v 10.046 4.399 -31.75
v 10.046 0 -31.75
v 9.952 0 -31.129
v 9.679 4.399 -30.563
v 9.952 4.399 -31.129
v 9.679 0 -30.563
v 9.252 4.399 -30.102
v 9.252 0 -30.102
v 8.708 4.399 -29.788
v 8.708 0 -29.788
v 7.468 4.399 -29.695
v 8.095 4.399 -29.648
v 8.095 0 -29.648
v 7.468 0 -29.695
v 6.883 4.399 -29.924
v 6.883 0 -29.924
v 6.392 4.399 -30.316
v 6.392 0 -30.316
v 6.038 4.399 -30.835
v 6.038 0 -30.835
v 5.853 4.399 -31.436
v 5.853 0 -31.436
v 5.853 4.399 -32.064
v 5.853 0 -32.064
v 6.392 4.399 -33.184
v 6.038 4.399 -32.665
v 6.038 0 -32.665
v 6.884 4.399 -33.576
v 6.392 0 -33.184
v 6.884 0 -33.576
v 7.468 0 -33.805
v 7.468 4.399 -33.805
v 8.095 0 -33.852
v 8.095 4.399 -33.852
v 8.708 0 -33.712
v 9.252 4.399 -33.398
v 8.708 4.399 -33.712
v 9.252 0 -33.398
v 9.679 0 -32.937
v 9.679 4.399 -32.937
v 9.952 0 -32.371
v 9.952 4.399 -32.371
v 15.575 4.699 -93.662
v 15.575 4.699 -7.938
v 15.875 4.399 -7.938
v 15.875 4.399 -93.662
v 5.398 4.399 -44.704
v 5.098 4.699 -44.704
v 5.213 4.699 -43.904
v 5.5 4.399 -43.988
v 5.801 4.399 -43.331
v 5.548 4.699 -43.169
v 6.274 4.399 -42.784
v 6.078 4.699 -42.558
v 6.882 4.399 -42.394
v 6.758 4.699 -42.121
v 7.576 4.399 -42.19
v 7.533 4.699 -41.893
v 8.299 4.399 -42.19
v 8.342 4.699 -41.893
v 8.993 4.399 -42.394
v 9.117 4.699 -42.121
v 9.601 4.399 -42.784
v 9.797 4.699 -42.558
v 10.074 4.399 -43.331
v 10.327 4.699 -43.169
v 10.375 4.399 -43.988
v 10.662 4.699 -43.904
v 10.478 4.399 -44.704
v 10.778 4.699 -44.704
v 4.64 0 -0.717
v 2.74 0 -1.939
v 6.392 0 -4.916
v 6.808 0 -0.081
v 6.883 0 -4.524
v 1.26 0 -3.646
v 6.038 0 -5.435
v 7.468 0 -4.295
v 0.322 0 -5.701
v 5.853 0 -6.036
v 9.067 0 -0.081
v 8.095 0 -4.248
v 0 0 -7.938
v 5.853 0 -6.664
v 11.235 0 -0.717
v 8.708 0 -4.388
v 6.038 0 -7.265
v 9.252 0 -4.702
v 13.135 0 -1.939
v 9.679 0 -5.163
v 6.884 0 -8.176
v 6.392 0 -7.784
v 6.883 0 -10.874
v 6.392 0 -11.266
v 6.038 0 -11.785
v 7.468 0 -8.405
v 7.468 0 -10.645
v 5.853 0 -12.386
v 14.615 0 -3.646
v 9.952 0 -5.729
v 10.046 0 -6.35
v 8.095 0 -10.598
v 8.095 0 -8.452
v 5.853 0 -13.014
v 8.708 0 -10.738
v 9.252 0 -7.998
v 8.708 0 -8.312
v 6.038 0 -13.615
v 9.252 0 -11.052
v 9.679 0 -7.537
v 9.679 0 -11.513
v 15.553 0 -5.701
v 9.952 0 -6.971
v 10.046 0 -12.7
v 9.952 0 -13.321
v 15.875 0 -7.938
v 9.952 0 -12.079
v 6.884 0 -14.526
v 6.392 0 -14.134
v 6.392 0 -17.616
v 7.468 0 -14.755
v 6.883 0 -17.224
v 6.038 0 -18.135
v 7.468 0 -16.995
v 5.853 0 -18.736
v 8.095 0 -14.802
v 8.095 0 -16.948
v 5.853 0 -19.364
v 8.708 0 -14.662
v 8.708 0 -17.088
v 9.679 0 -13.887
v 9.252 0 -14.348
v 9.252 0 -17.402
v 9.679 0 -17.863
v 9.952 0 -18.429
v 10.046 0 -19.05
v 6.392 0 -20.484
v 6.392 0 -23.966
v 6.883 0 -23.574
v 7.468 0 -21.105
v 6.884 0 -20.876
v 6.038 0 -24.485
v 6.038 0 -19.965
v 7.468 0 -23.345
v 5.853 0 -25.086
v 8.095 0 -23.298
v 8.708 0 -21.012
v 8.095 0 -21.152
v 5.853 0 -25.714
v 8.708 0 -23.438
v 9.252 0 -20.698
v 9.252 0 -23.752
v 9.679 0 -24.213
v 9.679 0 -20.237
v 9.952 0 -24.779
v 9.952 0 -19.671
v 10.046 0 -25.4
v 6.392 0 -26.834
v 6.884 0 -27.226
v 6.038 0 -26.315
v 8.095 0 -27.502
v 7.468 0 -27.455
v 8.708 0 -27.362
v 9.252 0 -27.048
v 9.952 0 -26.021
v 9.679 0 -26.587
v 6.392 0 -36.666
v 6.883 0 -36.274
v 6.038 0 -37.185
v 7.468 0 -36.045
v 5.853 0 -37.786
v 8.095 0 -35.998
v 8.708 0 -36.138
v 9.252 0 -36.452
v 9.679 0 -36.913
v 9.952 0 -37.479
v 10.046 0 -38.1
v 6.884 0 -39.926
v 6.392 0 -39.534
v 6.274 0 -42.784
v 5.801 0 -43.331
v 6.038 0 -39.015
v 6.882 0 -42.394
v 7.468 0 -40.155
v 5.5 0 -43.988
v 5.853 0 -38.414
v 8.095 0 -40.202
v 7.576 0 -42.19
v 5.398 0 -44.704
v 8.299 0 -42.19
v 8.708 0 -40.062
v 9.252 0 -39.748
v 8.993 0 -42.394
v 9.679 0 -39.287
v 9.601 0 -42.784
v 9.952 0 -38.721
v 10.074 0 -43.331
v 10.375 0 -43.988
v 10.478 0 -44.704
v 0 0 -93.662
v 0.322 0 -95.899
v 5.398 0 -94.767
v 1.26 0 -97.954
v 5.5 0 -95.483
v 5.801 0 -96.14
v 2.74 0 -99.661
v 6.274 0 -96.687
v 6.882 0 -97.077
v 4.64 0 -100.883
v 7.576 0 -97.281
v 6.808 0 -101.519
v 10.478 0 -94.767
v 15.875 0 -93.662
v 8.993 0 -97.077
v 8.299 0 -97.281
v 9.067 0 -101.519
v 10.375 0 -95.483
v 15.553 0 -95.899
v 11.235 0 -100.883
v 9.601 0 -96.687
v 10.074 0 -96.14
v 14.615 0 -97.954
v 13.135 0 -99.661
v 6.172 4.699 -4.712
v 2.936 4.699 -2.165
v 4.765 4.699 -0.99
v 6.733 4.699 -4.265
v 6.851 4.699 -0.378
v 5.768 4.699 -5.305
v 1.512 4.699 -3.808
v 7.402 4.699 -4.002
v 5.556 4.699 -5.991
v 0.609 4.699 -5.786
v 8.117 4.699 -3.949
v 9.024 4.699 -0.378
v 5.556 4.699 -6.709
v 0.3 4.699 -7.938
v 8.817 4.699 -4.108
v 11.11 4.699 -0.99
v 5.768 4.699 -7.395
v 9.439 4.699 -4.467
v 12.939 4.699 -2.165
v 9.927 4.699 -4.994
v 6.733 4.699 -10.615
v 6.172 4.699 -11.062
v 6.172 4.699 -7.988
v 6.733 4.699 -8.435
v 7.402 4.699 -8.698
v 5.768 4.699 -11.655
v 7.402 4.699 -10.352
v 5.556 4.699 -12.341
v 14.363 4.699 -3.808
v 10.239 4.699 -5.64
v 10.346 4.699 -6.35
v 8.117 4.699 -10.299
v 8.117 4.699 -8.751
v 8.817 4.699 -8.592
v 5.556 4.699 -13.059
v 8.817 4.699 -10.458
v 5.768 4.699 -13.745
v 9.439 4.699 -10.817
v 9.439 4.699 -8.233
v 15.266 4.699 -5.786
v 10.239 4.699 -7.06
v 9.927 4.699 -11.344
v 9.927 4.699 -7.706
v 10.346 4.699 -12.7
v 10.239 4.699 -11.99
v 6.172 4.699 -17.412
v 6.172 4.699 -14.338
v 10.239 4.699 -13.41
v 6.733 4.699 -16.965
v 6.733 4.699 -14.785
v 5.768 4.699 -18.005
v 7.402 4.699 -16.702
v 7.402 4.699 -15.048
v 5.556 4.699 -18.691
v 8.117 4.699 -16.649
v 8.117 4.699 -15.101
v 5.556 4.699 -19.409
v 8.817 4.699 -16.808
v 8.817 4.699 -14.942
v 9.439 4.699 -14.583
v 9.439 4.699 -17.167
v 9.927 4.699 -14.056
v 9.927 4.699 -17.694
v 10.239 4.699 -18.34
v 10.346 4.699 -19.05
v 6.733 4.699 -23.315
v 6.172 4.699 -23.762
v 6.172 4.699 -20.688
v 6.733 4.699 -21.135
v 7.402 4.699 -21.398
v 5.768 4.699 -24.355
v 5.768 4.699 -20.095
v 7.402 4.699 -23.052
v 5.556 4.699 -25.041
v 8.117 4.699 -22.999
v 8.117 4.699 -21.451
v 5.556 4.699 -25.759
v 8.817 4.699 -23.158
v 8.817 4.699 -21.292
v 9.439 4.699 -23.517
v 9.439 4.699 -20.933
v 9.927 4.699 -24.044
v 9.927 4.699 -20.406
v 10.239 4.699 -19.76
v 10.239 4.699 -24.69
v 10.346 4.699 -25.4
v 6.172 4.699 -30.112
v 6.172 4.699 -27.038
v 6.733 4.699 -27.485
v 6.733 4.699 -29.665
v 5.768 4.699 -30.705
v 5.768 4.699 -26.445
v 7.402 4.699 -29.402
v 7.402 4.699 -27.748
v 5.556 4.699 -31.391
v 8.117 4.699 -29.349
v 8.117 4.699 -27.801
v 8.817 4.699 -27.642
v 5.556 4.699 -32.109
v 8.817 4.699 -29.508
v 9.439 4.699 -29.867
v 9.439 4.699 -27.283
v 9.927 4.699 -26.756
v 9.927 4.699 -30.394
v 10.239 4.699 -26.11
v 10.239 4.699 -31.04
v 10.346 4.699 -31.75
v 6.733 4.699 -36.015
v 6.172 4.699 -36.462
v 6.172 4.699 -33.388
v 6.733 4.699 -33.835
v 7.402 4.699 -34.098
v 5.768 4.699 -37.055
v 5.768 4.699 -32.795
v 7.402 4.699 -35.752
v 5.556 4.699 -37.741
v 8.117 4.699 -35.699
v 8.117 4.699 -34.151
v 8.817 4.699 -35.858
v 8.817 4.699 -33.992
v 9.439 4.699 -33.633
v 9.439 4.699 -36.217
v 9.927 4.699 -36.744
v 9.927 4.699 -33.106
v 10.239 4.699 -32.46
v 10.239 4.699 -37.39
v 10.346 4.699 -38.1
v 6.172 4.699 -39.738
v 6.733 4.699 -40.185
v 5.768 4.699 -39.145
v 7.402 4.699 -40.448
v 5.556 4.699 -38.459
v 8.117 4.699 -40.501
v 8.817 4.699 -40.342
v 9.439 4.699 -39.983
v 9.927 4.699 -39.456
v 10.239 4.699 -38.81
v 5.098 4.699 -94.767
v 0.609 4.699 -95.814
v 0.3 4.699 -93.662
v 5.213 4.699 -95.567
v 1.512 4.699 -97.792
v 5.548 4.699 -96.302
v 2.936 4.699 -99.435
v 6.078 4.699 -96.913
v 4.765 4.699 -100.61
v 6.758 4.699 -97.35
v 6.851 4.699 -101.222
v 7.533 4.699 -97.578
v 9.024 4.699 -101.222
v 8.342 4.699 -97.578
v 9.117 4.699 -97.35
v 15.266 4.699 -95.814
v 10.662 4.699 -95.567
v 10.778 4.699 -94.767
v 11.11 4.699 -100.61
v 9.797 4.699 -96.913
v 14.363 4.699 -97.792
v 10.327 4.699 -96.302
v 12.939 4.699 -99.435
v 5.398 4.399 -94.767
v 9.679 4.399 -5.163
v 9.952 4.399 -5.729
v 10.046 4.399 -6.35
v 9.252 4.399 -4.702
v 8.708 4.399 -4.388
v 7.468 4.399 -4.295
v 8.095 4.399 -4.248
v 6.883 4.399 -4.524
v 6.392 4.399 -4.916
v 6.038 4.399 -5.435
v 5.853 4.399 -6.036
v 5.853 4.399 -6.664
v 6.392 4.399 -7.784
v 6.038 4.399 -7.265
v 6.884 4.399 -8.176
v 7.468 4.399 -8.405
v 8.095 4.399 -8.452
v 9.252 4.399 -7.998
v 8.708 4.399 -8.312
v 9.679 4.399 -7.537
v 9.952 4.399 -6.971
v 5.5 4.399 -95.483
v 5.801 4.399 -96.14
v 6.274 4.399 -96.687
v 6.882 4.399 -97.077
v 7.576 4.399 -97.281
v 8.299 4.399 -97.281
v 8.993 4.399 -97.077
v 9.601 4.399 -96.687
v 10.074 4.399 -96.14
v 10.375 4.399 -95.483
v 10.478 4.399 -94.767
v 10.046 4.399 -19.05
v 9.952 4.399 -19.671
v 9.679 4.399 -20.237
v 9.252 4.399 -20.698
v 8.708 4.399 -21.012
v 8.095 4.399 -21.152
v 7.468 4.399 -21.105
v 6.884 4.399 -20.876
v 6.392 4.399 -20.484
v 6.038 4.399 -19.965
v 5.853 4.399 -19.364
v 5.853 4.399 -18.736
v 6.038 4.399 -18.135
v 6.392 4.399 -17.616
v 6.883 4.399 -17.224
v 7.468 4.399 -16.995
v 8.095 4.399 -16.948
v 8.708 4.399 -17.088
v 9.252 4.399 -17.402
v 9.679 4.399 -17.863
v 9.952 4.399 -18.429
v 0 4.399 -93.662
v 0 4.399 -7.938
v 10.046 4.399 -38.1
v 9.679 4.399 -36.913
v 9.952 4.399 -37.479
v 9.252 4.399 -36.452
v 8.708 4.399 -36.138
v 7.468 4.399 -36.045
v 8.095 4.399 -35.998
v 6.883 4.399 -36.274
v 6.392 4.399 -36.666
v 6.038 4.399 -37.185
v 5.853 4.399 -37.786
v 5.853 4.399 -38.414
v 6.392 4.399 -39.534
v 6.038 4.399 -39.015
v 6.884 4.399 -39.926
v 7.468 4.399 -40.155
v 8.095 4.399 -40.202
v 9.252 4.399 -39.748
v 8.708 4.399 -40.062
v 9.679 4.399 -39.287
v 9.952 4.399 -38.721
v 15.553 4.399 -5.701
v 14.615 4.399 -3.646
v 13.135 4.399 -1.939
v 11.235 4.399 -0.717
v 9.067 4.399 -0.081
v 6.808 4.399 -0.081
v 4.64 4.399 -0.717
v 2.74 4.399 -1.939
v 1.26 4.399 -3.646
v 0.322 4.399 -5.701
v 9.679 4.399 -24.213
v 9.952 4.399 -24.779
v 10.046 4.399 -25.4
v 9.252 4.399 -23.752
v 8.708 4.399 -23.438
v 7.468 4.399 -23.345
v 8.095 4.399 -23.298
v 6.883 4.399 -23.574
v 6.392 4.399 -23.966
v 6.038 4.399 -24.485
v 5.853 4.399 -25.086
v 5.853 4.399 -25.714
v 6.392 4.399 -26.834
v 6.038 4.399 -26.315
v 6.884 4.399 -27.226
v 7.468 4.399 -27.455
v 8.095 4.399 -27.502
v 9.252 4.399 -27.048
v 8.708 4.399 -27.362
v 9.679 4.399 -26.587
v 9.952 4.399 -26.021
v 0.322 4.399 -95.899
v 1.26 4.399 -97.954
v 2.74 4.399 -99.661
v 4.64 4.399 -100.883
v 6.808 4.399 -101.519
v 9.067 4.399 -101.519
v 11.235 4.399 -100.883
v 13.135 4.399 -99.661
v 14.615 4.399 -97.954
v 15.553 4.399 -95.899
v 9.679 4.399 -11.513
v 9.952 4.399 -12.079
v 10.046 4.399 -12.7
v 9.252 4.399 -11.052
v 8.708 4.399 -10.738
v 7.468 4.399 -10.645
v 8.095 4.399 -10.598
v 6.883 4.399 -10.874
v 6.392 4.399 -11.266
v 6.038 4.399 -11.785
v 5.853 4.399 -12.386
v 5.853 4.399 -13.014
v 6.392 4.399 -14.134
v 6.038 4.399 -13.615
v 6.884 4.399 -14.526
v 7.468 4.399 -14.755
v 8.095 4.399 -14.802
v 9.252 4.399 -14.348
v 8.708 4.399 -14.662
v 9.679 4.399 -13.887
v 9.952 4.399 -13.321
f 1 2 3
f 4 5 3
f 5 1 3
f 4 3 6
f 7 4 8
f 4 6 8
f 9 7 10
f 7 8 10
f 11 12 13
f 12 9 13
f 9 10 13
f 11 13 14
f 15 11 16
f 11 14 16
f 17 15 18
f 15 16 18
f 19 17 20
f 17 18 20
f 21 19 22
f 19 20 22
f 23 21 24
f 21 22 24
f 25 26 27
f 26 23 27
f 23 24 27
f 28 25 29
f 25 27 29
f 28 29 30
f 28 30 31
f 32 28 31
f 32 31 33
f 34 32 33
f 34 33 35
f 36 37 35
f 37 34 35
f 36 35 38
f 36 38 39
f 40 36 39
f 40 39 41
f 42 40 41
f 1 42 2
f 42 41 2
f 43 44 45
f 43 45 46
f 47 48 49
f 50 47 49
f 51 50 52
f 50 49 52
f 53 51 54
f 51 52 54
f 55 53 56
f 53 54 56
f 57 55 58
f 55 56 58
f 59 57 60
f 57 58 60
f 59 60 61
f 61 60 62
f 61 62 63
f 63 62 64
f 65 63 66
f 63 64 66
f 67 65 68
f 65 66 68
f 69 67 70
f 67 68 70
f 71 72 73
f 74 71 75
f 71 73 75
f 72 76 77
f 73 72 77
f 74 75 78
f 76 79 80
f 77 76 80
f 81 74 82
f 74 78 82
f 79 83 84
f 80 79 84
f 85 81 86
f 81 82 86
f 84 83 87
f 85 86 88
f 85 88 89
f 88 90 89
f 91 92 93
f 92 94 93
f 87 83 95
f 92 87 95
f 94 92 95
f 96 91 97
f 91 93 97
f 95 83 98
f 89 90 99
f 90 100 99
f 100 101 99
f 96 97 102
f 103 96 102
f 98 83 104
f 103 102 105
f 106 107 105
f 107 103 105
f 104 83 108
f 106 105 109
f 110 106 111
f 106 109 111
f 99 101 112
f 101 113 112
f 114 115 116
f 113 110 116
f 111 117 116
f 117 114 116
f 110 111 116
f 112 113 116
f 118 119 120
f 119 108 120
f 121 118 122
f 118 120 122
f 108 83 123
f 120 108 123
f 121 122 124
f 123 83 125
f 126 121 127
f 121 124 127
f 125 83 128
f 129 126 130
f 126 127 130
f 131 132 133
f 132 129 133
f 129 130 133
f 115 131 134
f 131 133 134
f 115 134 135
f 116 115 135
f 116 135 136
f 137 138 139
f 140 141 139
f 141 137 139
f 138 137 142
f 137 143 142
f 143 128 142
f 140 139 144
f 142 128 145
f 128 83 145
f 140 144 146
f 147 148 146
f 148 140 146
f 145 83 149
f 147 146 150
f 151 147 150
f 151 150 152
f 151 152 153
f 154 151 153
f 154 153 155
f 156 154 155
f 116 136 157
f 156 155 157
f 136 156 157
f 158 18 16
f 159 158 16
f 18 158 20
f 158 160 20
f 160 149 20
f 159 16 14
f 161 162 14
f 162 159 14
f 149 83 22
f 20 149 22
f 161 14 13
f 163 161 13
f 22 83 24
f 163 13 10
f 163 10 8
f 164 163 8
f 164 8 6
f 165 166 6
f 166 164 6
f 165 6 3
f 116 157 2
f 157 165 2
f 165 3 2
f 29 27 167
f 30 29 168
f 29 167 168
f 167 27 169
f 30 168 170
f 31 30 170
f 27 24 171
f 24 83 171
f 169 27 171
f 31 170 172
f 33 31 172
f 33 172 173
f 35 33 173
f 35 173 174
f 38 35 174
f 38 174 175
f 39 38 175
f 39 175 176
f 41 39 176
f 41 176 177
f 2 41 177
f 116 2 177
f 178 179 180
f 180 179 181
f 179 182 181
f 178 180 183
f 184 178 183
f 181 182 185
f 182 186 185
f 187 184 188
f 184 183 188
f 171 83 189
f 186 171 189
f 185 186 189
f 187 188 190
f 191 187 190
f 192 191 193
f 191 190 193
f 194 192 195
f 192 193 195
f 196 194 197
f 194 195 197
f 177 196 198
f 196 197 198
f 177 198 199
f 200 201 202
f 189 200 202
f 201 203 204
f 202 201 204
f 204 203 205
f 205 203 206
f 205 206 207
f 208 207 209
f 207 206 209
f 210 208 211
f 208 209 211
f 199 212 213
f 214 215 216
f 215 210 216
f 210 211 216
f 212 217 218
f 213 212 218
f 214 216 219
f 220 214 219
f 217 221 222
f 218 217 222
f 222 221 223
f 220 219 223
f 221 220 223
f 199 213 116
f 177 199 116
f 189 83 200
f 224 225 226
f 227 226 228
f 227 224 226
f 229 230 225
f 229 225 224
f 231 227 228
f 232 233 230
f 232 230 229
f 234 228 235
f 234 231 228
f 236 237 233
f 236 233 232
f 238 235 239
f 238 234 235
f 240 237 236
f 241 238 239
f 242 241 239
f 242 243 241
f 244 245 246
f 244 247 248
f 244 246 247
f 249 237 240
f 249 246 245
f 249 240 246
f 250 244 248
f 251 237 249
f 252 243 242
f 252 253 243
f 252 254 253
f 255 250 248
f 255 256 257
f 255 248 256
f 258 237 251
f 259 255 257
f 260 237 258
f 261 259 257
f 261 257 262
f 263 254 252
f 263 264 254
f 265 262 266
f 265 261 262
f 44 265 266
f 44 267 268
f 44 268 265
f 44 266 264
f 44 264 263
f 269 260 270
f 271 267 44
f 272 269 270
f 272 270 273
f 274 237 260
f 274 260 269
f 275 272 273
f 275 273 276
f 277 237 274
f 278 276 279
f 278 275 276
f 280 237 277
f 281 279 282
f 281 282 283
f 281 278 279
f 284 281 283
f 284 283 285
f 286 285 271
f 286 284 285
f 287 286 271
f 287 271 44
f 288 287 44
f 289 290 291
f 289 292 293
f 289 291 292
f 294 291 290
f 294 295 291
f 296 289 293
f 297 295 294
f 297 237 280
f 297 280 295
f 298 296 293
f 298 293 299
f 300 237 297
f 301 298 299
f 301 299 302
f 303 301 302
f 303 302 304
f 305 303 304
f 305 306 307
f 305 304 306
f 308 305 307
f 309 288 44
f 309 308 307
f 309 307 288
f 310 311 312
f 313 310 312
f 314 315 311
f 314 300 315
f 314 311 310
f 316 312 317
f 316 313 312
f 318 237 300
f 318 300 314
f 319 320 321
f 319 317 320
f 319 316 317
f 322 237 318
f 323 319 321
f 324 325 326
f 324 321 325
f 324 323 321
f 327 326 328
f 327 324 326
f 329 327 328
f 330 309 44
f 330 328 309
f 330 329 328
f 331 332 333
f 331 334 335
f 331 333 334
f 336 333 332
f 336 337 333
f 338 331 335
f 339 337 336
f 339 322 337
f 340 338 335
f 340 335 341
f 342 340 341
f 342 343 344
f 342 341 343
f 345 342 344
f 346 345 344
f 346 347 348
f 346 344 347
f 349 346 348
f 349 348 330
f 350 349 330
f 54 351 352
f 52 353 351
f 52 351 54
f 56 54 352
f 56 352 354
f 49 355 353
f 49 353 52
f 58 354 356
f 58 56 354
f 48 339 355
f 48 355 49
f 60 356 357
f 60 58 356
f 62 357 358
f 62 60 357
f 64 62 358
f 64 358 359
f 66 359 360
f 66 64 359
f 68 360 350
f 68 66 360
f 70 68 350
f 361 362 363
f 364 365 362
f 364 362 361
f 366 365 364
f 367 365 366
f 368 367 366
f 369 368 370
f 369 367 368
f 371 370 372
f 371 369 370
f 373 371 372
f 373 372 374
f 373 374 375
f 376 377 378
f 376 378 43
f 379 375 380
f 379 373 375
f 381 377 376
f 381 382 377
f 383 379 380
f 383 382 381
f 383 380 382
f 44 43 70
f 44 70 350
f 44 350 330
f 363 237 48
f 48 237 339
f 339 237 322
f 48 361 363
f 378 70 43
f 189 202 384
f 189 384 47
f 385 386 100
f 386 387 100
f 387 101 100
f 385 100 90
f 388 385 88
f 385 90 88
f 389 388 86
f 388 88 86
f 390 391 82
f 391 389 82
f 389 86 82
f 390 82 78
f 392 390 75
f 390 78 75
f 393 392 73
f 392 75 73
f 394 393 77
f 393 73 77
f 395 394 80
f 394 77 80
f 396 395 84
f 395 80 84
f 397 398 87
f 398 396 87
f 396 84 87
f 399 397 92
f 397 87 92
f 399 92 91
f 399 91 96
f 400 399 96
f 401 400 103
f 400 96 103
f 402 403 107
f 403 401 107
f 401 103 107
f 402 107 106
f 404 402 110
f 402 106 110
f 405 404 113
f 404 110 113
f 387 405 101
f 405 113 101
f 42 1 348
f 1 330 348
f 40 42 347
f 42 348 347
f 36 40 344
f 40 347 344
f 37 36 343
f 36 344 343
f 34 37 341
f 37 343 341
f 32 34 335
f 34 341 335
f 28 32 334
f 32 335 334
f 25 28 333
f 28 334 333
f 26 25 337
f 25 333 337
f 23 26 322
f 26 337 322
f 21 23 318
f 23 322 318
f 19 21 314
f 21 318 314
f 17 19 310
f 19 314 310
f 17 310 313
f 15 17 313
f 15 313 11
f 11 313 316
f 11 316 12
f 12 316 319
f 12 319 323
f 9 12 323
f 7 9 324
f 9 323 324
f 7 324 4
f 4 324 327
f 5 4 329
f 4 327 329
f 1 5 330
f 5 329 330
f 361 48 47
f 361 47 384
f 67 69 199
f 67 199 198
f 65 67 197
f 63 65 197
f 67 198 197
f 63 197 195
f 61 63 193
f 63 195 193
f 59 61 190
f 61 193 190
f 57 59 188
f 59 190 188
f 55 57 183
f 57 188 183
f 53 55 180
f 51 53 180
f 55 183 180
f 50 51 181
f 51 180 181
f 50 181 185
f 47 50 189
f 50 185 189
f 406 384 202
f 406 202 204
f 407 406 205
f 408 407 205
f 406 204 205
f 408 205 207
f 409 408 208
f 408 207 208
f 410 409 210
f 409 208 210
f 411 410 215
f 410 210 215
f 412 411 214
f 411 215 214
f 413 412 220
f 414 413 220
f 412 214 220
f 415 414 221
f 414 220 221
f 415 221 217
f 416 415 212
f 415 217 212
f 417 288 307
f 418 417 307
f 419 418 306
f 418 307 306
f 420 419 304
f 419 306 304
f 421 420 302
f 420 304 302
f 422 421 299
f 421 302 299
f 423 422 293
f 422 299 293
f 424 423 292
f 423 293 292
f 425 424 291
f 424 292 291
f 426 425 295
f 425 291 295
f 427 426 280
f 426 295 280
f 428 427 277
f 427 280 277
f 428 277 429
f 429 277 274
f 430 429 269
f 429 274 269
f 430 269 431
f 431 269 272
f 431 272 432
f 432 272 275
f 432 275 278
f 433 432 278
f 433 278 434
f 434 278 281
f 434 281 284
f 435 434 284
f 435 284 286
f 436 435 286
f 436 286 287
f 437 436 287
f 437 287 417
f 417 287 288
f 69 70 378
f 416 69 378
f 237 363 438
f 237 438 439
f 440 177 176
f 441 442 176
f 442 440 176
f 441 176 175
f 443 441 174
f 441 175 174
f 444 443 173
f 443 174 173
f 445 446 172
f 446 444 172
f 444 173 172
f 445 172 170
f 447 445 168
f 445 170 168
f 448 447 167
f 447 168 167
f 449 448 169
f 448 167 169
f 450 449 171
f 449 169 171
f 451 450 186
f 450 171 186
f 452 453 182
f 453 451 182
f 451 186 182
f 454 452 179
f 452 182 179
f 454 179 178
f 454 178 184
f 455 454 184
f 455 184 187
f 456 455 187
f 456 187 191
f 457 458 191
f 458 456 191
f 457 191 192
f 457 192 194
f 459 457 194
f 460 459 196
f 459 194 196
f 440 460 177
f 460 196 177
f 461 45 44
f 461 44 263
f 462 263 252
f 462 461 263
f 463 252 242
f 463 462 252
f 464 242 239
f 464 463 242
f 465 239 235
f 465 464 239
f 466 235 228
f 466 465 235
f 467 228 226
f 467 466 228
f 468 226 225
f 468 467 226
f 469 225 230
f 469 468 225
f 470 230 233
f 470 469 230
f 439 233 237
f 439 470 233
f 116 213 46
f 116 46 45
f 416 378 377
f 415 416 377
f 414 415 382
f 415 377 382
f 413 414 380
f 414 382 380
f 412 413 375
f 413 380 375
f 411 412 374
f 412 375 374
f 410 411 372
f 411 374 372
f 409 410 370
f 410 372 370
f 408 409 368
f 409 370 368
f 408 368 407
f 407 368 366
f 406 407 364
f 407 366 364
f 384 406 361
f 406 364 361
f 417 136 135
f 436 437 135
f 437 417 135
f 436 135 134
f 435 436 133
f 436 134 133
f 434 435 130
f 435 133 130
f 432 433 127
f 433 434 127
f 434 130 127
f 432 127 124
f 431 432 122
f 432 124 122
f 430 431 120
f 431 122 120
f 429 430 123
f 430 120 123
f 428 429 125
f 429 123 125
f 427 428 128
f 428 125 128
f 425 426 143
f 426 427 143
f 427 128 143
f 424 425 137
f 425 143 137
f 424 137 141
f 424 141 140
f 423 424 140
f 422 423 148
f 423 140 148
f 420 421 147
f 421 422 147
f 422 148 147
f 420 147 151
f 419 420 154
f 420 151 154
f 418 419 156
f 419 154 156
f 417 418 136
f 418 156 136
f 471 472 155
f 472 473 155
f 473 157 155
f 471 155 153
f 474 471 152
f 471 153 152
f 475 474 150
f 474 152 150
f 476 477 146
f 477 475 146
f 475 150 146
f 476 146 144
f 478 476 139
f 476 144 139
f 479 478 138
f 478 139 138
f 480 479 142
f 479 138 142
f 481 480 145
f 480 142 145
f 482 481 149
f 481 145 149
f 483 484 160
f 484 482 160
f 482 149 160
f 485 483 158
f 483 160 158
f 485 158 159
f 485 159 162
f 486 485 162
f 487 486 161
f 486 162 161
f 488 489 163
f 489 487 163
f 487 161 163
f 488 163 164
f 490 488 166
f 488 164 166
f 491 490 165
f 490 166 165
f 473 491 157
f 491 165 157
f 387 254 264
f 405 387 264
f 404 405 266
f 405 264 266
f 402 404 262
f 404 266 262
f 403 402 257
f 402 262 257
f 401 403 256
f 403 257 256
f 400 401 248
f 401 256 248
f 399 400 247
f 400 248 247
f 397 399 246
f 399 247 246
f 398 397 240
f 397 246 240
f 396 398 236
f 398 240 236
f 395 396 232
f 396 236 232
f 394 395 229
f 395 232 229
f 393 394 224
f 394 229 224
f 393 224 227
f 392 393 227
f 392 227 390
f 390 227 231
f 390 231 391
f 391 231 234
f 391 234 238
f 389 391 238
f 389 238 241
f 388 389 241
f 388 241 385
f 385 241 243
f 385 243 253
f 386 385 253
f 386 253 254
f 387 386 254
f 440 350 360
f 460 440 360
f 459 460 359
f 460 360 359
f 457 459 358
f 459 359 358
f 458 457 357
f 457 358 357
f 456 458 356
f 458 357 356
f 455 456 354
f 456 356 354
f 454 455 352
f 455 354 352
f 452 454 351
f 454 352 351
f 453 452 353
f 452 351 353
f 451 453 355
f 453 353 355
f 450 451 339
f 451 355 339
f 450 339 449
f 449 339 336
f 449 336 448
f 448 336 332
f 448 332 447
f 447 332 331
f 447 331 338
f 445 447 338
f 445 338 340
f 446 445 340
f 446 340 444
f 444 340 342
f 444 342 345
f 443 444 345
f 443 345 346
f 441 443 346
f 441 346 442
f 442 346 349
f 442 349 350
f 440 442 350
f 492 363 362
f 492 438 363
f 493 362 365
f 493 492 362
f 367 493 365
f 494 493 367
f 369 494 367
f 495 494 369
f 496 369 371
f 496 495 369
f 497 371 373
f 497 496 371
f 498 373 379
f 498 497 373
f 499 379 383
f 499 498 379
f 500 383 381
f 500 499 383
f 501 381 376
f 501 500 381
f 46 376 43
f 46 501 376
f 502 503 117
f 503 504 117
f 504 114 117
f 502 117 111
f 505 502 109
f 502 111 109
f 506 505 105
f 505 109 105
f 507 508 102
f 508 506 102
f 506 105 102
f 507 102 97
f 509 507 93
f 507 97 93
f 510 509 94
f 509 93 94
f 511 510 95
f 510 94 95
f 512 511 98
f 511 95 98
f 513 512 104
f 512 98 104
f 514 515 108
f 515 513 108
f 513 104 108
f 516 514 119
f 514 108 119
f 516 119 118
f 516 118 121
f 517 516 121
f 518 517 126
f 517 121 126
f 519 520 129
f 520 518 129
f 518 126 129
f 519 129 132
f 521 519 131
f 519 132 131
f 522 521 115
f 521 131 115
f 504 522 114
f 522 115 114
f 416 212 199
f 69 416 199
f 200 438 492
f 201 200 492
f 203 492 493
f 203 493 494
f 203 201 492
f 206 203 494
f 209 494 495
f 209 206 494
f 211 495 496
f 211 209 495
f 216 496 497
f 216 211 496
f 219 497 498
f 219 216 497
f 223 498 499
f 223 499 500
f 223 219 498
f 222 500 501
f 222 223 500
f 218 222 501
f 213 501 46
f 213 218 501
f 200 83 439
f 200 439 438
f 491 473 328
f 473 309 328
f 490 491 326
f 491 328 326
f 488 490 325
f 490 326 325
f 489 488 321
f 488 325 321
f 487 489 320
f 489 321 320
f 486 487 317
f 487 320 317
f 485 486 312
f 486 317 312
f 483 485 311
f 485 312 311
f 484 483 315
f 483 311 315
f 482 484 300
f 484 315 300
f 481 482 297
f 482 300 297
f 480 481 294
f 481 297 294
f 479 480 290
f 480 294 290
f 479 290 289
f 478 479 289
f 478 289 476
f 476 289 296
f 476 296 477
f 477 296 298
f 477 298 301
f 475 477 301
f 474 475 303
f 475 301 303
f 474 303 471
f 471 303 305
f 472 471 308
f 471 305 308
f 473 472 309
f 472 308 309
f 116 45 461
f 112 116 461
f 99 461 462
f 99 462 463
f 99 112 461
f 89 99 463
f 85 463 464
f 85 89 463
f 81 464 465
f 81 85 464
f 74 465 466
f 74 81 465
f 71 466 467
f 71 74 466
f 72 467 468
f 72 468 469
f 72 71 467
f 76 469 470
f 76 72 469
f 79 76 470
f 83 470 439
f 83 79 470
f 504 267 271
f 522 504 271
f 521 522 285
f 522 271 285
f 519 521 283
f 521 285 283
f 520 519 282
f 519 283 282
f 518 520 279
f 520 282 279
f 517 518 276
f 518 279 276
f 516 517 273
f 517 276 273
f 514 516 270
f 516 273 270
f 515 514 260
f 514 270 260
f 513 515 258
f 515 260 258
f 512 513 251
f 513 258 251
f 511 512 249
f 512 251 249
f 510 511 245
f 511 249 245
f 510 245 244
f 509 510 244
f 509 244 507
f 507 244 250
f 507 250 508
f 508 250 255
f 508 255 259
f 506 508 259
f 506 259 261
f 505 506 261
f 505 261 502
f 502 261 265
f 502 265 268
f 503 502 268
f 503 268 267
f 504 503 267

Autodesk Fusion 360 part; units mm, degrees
sketch "Esboço1" plane through (0, 0, 0) normal (0, 1, 0) x (1, 0, 0)
  line L0 (0, 7.9375) -> (0, 93.6625)
  line L1 (15.875, 93.6625) -> (15.875, 7.9375)
  arc A0 (0, 7.9375) -> (15.875, 7.9375) centre (7.9375, 7.9375) ccw
  arc A1 (15.875, 93.6625) -> (0, 93.6625) centre (7.9375, 93.6625) ccw
  line L2 (7.9375, 38.1) -> (7.9375, 38)
  line L3 (7.9375, 6.35) -> (7.9375, 7.9375)
  circle A2 centre (7.9375, 6.35) radius 2.108
  circle A3 centre (7.9375, 12.7) radius 2.108
  circle A4 centre (7.9375, 19.05) radius 2.108
  circle A5 centre (7.9375, 25.4) radius 2.108
  circle A6 centre (7.9375, 31.75) radius 2.108
  circle A7 centre (7.9375, 38.1) radius 2.108
  line L4 (7.9375, 12.7) -> (7.9375, 14.808)
  arc A8 (10.4775, 94.767) -> (5.3975, 94.767) centre (7.9375, 94.767) ccw
  arc A9 (5.3975, 44.704) -> (10.4775, 44.704) centre (7.9375, 44.704) ccw
  line L5 (5.3975, 94.767) -> (5.3975, 44.704)
  line L6 (10.4775, 94.767) -> (10.4775, 44.704)
  dimension "d7" = 6.35
  dimension "d8" = 6.35
  dimension "d9" = 6.35
  dimension "d10" = 6.35
  dimension "d11" = 6.35
  dimension "d12" = 4.216
  dimension "d13" = 4.216
  dimension "d14" = 4.216
  dimension "d15" = 4.216
  dimension "d16" = 4.216
  dimension "d17" = 4.216
  dimension "d19" = 5.08
  dimension "d20" = 50.063
  dimension "d21" = 5.08
extrude "Extrusão1" add sketch "Esboço1" along normal blind 4.699
chamfer "Chanfro1" distance 0.3 angle 45 14 edges at (15.875, 4.699, -50.8) (7.9375, 4.699, -101.6) (0, 4.699, -50.8) (7.9375, 4.699, 0) (10.4775, 4.699, -69.7355) (7.9375, 4.699, -42.164) (5.3975, 4.699, -69.7355) (7.9375, 4.699, -97.307) (5.9722, 4.699, -38.8623) (5.9722, 4.699, -32.5123) (5.9722, 4.699, -26.1623) (5.9722, 4.699, -19.8123) (5.9722, 4.699, -13.4623) (5.9722, 4.699, -7.1123)
